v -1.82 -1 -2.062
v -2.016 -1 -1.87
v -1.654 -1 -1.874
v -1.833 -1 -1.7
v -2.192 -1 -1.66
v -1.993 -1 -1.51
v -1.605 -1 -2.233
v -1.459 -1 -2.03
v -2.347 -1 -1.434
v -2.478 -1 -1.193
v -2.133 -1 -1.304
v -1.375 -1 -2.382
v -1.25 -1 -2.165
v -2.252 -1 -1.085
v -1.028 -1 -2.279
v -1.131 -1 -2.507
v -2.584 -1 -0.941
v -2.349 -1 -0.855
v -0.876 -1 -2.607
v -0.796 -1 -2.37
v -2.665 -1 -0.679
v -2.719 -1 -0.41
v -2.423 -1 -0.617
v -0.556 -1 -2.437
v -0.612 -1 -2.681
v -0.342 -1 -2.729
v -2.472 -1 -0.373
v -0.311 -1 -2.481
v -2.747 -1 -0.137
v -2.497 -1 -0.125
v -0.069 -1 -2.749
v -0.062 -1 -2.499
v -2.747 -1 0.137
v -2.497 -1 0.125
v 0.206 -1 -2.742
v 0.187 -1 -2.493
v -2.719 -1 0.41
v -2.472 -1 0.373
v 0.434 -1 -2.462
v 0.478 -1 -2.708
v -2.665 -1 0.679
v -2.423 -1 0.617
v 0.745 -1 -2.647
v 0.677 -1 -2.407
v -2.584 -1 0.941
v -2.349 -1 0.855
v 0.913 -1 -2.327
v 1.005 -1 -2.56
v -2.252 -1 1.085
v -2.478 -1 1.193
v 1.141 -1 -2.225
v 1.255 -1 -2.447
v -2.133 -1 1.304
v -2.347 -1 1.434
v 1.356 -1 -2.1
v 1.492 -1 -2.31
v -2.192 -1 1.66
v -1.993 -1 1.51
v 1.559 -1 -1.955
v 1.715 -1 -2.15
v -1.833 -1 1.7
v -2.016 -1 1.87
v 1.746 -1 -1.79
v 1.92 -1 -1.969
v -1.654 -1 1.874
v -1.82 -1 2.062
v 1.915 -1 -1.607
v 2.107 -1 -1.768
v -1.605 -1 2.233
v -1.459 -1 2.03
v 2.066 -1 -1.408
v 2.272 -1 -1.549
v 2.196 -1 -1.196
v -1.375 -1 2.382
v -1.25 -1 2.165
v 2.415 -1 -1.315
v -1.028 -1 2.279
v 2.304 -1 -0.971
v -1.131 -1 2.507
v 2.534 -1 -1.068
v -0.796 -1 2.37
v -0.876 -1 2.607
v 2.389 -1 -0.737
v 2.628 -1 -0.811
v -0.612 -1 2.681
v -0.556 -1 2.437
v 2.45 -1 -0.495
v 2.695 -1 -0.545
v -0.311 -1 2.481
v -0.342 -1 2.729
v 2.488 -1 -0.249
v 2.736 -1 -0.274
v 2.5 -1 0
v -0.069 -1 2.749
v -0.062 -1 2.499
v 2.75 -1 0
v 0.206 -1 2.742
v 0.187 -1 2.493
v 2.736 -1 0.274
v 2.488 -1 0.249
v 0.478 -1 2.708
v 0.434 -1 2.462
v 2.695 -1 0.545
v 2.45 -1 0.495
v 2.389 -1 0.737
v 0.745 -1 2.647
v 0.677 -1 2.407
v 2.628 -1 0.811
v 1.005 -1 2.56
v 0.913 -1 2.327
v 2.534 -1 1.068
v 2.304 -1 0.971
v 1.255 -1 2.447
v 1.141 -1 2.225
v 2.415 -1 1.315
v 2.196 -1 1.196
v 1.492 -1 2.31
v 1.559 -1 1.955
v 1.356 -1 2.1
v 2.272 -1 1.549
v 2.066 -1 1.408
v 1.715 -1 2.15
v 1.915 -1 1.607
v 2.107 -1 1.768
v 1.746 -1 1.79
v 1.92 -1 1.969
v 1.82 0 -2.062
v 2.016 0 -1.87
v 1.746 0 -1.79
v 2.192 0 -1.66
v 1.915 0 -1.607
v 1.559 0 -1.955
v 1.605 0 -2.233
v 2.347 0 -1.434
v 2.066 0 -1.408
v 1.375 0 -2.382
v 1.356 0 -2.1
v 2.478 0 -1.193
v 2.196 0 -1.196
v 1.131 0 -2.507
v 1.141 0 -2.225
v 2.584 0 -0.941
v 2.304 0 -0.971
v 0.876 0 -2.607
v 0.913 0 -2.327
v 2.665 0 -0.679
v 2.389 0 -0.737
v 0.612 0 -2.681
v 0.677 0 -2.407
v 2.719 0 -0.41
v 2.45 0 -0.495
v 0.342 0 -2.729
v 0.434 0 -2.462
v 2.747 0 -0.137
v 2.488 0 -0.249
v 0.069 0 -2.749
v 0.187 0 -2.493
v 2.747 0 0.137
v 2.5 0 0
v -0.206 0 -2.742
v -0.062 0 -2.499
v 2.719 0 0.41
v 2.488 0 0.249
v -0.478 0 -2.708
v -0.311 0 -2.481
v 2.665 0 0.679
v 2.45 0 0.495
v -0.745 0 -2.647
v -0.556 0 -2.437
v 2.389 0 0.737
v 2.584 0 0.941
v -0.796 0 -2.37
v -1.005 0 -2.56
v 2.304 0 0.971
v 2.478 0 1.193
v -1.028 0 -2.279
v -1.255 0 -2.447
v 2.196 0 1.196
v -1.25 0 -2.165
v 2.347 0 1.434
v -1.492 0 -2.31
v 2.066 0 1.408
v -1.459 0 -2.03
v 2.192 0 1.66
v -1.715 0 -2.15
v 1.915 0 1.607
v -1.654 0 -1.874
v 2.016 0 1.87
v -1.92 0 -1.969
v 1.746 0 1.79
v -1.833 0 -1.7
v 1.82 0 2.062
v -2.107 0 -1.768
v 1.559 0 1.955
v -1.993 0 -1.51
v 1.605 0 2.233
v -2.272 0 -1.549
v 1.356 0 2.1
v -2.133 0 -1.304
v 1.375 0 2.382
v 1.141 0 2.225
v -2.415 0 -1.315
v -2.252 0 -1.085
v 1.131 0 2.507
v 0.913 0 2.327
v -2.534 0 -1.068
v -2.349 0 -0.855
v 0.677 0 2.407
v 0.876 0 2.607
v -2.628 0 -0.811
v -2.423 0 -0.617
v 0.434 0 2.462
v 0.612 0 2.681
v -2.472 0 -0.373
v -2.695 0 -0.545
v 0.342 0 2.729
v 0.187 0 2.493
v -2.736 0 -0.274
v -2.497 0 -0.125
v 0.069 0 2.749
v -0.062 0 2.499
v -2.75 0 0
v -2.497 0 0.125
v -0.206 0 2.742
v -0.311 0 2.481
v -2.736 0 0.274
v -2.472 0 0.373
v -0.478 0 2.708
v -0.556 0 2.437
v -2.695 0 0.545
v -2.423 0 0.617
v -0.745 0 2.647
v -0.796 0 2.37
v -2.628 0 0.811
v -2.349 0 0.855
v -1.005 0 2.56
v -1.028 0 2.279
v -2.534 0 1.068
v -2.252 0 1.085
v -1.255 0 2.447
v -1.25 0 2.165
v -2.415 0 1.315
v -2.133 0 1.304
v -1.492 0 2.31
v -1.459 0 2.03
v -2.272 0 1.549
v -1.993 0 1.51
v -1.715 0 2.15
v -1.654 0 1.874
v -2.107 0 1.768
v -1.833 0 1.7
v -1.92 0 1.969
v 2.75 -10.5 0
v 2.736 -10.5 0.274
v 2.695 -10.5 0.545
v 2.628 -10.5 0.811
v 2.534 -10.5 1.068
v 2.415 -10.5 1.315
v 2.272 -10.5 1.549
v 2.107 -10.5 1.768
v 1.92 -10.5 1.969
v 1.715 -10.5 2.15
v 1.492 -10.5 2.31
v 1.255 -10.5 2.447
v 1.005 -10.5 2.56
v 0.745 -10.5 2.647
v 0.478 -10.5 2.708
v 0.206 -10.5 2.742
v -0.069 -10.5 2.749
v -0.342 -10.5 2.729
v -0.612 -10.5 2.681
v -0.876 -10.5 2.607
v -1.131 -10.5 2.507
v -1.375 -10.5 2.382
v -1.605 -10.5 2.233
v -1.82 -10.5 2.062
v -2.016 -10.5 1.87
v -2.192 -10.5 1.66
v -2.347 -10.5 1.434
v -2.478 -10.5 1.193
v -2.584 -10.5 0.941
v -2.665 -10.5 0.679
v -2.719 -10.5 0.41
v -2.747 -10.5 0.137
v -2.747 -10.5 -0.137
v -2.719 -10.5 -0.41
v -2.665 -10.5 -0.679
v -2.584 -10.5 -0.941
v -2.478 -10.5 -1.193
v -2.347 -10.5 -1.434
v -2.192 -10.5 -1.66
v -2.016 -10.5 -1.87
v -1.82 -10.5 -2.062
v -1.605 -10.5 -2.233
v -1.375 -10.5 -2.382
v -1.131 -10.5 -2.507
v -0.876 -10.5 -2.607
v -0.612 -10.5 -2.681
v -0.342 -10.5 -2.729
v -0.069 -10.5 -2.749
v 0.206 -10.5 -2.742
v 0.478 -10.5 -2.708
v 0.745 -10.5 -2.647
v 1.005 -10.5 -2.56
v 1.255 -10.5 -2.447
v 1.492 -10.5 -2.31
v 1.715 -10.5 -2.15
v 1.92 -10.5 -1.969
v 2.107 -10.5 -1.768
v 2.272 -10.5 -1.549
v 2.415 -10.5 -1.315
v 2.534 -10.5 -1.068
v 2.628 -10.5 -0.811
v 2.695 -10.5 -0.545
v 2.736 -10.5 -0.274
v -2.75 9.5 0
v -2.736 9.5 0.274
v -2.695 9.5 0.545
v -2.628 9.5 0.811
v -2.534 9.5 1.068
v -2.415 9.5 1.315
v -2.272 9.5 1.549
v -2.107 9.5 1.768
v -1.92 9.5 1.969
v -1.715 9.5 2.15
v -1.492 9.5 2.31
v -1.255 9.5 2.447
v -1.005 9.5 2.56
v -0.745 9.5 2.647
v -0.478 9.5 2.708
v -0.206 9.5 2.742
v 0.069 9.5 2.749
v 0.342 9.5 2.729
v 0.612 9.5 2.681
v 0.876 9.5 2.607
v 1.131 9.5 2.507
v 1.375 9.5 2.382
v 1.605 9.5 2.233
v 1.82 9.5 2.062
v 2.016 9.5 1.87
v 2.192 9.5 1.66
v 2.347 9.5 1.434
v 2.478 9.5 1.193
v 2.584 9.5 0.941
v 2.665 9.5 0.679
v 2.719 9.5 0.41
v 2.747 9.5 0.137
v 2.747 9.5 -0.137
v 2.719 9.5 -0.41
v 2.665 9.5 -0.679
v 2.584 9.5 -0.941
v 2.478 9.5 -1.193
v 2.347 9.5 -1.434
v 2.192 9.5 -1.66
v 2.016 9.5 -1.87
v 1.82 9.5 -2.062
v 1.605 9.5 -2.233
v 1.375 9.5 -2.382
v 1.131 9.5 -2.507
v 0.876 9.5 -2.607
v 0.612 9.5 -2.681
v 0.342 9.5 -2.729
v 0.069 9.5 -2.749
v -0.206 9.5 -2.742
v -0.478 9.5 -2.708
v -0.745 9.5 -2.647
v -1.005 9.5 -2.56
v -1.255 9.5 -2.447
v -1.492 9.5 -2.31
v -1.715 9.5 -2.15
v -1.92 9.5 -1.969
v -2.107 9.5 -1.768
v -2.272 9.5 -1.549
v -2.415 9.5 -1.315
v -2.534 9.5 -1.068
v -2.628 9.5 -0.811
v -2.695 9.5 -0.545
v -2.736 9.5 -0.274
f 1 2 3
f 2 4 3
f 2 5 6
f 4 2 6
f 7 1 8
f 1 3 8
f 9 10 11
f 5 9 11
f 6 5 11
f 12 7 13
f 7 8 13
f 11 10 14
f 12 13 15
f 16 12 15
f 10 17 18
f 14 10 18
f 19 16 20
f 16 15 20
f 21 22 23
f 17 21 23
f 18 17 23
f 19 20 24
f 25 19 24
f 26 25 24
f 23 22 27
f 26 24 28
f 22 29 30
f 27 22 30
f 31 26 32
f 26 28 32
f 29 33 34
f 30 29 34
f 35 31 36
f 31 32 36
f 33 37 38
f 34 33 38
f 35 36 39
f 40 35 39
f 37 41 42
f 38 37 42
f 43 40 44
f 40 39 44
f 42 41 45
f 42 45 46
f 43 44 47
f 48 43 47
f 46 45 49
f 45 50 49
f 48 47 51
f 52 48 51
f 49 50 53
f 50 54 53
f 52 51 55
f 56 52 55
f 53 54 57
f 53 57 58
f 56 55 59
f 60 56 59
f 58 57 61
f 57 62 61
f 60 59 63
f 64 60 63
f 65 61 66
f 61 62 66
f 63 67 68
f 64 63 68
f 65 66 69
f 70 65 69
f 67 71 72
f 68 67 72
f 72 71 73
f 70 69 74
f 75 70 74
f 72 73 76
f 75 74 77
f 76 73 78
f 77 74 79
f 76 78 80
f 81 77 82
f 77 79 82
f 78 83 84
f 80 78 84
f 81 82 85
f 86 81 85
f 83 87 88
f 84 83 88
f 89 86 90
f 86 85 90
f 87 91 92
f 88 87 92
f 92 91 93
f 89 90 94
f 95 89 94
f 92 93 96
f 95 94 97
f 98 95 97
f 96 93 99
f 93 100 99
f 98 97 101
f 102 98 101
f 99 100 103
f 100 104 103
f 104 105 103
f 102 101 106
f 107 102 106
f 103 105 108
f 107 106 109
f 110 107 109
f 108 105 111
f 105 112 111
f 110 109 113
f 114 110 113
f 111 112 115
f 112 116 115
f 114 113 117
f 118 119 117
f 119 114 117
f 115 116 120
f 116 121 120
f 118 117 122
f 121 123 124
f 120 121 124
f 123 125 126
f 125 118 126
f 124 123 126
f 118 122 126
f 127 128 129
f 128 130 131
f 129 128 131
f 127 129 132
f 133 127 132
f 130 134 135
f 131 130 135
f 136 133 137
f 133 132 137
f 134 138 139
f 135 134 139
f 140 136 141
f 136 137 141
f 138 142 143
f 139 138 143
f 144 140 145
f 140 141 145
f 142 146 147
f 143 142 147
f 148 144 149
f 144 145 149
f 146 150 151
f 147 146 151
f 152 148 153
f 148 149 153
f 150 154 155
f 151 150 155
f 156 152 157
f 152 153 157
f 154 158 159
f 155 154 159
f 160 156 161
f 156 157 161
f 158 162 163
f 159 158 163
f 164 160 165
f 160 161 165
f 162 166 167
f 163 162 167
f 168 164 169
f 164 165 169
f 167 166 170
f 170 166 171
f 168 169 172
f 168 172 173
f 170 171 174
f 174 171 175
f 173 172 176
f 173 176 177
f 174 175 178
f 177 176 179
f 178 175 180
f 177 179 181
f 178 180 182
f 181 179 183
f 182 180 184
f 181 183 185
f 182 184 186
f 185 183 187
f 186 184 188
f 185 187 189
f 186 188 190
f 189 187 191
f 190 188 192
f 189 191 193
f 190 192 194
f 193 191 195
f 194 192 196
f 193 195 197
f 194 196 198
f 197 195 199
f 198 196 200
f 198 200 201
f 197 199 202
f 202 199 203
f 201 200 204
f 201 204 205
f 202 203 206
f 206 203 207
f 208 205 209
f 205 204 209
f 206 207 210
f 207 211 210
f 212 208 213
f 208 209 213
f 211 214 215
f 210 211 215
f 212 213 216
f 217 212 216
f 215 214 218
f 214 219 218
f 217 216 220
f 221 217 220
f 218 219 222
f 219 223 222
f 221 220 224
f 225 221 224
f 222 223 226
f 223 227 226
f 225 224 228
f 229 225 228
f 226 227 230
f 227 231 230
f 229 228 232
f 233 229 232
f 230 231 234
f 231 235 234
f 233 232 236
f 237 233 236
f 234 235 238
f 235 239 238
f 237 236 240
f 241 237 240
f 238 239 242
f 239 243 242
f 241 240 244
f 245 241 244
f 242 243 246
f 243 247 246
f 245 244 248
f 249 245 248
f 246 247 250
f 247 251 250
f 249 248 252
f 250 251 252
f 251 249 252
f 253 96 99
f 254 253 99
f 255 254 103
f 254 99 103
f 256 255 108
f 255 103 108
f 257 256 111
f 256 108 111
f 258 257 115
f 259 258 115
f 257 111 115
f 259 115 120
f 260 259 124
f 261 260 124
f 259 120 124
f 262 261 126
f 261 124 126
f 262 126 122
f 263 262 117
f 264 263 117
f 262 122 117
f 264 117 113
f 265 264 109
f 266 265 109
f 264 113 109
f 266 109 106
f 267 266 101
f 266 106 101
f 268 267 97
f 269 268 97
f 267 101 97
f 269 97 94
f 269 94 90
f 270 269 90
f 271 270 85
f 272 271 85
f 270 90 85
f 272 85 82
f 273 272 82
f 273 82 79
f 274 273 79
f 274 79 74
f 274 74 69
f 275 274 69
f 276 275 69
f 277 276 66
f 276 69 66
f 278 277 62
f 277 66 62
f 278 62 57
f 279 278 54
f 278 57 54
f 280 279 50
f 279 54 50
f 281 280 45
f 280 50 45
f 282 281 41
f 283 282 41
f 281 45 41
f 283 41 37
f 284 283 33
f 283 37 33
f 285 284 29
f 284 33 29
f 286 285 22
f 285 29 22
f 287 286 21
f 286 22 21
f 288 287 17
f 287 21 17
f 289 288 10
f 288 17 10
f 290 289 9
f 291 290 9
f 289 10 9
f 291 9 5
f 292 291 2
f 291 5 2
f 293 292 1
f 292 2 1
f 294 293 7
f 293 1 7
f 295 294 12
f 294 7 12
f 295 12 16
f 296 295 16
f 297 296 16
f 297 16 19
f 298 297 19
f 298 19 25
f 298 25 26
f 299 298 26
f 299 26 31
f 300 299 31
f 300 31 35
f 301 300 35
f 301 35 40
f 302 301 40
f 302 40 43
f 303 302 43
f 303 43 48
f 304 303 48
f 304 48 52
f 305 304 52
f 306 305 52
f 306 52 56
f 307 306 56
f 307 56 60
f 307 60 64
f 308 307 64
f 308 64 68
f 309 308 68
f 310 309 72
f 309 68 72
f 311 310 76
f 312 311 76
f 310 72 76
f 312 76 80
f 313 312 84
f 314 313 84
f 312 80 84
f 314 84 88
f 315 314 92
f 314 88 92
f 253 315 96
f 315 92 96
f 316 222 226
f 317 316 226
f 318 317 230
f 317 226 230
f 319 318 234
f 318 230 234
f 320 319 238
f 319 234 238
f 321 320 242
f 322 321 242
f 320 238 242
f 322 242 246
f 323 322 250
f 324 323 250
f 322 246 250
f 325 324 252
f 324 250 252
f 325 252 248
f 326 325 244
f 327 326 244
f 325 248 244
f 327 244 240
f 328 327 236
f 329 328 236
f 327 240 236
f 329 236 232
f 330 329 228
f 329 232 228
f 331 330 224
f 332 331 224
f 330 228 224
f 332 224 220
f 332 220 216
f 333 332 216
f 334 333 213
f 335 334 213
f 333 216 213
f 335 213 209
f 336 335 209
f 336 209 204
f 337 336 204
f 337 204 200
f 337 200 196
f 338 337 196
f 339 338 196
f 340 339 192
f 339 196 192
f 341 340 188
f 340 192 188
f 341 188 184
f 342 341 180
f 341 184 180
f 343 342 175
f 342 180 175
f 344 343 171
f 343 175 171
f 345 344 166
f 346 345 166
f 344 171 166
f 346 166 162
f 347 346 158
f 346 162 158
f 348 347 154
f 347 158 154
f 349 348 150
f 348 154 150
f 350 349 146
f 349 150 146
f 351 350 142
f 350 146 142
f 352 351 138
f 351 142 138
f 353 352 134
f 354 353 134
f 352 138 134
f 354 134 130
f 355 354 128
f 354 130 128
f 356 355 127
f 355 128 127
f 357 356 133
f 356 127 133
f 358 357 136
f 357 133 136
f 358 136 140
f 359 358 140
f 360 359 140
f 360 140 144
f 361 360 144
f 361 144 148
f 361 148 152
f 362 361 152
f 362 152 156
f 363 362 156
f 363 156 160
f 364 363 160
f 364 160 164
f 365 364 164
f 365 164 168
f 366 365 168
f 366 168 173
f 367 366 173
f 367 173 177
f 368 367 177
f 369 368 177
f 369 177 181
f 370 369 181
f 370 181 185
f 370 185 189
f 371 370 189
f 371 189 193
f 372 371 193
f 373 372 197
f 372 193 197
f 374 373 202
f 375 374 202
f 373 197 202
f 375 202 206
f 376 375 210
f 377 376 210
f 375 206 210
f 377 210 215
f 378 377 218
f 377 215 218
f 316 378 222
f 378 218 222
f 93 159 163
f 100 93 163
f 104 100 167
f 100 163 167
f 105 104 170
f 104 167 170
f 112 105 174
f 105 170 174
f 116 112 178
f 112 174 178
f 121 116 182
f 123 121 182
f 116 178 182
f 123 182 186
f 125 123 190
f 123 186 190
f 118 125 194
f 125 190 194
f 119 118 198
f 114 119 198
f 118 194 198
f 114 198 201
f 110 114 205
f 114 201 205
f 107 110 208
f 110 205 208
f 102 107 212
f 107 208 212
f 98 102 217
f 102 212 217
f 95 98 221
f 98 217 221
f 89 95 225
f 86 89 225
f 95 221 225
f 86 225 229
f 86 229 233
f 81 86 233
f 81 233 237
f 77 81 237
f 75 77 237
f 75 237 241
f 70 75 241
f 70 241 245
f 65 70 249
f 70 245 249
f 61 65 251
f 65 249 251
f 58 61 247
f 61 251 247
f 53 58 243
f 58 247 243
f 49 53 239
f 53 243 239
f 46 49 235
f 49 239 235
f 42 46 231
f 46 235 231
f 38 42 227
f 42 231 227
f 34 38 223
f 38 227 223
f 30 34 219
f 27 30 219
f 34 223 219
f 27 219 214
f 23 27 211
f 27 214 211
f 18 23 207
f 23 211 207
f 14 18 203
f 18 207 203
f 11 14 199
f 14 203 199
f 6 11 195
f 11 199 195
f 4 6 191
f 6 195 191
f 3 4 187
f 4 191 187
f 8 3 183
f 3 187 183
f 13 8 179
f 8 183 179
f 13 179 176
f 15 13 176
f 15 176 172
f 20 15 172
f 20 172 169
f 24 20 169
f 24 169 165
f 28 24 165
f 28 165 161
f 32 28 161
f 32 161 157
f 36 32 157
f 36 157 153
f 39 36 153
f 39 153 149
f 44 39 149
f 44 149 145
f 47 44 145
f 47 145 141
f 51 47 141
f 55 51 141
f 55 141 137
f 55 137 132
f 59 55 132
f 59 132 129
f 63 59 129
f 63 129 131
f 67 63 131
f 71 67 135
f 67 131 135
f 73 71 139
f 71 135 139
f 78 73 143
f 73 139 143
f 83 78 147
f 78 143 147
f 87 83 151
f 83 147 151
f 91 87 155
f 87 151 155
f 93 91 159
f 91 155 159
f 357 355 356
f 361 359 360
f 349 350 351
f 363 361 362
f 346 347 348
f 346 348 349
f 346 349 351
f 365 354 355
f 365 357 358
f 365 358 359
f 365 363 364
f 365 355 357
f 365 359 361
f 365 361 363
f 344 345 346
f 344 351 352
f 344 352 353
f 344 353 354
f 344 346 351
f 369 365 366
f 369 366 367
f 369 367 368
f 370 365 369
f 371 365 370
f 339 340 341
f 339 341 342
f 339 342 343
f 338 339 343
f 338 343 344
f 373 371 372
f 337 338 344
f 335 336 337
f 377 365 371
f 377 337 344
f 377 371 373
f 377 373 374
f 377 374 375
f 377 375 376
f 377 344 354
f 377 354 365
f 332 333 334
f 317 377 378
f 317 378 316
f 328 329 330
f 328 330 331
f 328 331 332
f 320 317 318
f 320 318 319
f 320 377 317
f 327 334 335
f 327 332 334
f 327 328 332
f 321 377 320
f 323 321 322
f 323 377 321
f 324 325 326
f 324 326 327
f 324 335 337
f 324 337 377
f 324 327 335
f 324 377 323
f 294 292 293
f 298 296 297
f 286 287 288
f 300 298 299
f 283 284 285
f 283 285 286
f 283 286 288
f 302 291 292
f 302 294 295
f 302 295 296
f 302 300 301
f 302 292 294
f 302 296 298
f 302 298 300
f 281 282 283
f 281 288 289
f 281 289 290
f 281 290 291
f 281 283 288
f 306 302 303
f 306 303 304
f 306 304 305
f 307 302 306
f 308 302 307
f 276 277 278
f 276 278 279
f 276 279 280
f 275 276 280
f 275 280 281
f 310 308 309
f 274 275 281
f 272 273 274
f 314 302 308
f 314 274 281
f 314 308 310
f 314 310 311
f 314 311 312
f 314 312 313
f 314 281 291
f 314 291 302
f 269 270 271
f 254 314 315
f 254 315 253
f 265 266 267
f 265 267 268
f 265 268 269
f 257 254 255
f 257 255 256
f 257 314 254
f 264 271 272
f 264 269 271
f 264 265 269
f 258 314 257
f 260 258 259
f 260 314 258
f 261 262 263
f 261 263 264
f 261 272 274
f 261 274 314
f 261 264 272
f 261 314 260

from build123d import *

# Parameters (mm, degrees)
F0_R     = 2.5
F1_DEPTH = 1
F2_R     = 2.75
F3_DEPTH = 9.5
F4_R     = 2.75
F5_DEPTH = 9.5


with BuildPart() as f1:
    # F0 (on Front) → F1 (new body)
    with BuildSketch(Plane.XZ):
        Circle(F0_R)
    extrude(amount=F1_DEPTH)

    # F2 (on face) → F3 (join)
    with BuildSketch(Plane(origin=(0, 0, 0), x_dir=(-1, 0, 0), z_dir=(0, 1, 0))):
        Circle(F2_R)
    extrude(amount=F3_DEPTH)

    # F4 (on face) → F5 (join)
    with BuildSketch(Plane.XZ.offset(1)):
        Circle(F4_R)
    extrude(amount=F5_DEPTH)


solid = f1.part
